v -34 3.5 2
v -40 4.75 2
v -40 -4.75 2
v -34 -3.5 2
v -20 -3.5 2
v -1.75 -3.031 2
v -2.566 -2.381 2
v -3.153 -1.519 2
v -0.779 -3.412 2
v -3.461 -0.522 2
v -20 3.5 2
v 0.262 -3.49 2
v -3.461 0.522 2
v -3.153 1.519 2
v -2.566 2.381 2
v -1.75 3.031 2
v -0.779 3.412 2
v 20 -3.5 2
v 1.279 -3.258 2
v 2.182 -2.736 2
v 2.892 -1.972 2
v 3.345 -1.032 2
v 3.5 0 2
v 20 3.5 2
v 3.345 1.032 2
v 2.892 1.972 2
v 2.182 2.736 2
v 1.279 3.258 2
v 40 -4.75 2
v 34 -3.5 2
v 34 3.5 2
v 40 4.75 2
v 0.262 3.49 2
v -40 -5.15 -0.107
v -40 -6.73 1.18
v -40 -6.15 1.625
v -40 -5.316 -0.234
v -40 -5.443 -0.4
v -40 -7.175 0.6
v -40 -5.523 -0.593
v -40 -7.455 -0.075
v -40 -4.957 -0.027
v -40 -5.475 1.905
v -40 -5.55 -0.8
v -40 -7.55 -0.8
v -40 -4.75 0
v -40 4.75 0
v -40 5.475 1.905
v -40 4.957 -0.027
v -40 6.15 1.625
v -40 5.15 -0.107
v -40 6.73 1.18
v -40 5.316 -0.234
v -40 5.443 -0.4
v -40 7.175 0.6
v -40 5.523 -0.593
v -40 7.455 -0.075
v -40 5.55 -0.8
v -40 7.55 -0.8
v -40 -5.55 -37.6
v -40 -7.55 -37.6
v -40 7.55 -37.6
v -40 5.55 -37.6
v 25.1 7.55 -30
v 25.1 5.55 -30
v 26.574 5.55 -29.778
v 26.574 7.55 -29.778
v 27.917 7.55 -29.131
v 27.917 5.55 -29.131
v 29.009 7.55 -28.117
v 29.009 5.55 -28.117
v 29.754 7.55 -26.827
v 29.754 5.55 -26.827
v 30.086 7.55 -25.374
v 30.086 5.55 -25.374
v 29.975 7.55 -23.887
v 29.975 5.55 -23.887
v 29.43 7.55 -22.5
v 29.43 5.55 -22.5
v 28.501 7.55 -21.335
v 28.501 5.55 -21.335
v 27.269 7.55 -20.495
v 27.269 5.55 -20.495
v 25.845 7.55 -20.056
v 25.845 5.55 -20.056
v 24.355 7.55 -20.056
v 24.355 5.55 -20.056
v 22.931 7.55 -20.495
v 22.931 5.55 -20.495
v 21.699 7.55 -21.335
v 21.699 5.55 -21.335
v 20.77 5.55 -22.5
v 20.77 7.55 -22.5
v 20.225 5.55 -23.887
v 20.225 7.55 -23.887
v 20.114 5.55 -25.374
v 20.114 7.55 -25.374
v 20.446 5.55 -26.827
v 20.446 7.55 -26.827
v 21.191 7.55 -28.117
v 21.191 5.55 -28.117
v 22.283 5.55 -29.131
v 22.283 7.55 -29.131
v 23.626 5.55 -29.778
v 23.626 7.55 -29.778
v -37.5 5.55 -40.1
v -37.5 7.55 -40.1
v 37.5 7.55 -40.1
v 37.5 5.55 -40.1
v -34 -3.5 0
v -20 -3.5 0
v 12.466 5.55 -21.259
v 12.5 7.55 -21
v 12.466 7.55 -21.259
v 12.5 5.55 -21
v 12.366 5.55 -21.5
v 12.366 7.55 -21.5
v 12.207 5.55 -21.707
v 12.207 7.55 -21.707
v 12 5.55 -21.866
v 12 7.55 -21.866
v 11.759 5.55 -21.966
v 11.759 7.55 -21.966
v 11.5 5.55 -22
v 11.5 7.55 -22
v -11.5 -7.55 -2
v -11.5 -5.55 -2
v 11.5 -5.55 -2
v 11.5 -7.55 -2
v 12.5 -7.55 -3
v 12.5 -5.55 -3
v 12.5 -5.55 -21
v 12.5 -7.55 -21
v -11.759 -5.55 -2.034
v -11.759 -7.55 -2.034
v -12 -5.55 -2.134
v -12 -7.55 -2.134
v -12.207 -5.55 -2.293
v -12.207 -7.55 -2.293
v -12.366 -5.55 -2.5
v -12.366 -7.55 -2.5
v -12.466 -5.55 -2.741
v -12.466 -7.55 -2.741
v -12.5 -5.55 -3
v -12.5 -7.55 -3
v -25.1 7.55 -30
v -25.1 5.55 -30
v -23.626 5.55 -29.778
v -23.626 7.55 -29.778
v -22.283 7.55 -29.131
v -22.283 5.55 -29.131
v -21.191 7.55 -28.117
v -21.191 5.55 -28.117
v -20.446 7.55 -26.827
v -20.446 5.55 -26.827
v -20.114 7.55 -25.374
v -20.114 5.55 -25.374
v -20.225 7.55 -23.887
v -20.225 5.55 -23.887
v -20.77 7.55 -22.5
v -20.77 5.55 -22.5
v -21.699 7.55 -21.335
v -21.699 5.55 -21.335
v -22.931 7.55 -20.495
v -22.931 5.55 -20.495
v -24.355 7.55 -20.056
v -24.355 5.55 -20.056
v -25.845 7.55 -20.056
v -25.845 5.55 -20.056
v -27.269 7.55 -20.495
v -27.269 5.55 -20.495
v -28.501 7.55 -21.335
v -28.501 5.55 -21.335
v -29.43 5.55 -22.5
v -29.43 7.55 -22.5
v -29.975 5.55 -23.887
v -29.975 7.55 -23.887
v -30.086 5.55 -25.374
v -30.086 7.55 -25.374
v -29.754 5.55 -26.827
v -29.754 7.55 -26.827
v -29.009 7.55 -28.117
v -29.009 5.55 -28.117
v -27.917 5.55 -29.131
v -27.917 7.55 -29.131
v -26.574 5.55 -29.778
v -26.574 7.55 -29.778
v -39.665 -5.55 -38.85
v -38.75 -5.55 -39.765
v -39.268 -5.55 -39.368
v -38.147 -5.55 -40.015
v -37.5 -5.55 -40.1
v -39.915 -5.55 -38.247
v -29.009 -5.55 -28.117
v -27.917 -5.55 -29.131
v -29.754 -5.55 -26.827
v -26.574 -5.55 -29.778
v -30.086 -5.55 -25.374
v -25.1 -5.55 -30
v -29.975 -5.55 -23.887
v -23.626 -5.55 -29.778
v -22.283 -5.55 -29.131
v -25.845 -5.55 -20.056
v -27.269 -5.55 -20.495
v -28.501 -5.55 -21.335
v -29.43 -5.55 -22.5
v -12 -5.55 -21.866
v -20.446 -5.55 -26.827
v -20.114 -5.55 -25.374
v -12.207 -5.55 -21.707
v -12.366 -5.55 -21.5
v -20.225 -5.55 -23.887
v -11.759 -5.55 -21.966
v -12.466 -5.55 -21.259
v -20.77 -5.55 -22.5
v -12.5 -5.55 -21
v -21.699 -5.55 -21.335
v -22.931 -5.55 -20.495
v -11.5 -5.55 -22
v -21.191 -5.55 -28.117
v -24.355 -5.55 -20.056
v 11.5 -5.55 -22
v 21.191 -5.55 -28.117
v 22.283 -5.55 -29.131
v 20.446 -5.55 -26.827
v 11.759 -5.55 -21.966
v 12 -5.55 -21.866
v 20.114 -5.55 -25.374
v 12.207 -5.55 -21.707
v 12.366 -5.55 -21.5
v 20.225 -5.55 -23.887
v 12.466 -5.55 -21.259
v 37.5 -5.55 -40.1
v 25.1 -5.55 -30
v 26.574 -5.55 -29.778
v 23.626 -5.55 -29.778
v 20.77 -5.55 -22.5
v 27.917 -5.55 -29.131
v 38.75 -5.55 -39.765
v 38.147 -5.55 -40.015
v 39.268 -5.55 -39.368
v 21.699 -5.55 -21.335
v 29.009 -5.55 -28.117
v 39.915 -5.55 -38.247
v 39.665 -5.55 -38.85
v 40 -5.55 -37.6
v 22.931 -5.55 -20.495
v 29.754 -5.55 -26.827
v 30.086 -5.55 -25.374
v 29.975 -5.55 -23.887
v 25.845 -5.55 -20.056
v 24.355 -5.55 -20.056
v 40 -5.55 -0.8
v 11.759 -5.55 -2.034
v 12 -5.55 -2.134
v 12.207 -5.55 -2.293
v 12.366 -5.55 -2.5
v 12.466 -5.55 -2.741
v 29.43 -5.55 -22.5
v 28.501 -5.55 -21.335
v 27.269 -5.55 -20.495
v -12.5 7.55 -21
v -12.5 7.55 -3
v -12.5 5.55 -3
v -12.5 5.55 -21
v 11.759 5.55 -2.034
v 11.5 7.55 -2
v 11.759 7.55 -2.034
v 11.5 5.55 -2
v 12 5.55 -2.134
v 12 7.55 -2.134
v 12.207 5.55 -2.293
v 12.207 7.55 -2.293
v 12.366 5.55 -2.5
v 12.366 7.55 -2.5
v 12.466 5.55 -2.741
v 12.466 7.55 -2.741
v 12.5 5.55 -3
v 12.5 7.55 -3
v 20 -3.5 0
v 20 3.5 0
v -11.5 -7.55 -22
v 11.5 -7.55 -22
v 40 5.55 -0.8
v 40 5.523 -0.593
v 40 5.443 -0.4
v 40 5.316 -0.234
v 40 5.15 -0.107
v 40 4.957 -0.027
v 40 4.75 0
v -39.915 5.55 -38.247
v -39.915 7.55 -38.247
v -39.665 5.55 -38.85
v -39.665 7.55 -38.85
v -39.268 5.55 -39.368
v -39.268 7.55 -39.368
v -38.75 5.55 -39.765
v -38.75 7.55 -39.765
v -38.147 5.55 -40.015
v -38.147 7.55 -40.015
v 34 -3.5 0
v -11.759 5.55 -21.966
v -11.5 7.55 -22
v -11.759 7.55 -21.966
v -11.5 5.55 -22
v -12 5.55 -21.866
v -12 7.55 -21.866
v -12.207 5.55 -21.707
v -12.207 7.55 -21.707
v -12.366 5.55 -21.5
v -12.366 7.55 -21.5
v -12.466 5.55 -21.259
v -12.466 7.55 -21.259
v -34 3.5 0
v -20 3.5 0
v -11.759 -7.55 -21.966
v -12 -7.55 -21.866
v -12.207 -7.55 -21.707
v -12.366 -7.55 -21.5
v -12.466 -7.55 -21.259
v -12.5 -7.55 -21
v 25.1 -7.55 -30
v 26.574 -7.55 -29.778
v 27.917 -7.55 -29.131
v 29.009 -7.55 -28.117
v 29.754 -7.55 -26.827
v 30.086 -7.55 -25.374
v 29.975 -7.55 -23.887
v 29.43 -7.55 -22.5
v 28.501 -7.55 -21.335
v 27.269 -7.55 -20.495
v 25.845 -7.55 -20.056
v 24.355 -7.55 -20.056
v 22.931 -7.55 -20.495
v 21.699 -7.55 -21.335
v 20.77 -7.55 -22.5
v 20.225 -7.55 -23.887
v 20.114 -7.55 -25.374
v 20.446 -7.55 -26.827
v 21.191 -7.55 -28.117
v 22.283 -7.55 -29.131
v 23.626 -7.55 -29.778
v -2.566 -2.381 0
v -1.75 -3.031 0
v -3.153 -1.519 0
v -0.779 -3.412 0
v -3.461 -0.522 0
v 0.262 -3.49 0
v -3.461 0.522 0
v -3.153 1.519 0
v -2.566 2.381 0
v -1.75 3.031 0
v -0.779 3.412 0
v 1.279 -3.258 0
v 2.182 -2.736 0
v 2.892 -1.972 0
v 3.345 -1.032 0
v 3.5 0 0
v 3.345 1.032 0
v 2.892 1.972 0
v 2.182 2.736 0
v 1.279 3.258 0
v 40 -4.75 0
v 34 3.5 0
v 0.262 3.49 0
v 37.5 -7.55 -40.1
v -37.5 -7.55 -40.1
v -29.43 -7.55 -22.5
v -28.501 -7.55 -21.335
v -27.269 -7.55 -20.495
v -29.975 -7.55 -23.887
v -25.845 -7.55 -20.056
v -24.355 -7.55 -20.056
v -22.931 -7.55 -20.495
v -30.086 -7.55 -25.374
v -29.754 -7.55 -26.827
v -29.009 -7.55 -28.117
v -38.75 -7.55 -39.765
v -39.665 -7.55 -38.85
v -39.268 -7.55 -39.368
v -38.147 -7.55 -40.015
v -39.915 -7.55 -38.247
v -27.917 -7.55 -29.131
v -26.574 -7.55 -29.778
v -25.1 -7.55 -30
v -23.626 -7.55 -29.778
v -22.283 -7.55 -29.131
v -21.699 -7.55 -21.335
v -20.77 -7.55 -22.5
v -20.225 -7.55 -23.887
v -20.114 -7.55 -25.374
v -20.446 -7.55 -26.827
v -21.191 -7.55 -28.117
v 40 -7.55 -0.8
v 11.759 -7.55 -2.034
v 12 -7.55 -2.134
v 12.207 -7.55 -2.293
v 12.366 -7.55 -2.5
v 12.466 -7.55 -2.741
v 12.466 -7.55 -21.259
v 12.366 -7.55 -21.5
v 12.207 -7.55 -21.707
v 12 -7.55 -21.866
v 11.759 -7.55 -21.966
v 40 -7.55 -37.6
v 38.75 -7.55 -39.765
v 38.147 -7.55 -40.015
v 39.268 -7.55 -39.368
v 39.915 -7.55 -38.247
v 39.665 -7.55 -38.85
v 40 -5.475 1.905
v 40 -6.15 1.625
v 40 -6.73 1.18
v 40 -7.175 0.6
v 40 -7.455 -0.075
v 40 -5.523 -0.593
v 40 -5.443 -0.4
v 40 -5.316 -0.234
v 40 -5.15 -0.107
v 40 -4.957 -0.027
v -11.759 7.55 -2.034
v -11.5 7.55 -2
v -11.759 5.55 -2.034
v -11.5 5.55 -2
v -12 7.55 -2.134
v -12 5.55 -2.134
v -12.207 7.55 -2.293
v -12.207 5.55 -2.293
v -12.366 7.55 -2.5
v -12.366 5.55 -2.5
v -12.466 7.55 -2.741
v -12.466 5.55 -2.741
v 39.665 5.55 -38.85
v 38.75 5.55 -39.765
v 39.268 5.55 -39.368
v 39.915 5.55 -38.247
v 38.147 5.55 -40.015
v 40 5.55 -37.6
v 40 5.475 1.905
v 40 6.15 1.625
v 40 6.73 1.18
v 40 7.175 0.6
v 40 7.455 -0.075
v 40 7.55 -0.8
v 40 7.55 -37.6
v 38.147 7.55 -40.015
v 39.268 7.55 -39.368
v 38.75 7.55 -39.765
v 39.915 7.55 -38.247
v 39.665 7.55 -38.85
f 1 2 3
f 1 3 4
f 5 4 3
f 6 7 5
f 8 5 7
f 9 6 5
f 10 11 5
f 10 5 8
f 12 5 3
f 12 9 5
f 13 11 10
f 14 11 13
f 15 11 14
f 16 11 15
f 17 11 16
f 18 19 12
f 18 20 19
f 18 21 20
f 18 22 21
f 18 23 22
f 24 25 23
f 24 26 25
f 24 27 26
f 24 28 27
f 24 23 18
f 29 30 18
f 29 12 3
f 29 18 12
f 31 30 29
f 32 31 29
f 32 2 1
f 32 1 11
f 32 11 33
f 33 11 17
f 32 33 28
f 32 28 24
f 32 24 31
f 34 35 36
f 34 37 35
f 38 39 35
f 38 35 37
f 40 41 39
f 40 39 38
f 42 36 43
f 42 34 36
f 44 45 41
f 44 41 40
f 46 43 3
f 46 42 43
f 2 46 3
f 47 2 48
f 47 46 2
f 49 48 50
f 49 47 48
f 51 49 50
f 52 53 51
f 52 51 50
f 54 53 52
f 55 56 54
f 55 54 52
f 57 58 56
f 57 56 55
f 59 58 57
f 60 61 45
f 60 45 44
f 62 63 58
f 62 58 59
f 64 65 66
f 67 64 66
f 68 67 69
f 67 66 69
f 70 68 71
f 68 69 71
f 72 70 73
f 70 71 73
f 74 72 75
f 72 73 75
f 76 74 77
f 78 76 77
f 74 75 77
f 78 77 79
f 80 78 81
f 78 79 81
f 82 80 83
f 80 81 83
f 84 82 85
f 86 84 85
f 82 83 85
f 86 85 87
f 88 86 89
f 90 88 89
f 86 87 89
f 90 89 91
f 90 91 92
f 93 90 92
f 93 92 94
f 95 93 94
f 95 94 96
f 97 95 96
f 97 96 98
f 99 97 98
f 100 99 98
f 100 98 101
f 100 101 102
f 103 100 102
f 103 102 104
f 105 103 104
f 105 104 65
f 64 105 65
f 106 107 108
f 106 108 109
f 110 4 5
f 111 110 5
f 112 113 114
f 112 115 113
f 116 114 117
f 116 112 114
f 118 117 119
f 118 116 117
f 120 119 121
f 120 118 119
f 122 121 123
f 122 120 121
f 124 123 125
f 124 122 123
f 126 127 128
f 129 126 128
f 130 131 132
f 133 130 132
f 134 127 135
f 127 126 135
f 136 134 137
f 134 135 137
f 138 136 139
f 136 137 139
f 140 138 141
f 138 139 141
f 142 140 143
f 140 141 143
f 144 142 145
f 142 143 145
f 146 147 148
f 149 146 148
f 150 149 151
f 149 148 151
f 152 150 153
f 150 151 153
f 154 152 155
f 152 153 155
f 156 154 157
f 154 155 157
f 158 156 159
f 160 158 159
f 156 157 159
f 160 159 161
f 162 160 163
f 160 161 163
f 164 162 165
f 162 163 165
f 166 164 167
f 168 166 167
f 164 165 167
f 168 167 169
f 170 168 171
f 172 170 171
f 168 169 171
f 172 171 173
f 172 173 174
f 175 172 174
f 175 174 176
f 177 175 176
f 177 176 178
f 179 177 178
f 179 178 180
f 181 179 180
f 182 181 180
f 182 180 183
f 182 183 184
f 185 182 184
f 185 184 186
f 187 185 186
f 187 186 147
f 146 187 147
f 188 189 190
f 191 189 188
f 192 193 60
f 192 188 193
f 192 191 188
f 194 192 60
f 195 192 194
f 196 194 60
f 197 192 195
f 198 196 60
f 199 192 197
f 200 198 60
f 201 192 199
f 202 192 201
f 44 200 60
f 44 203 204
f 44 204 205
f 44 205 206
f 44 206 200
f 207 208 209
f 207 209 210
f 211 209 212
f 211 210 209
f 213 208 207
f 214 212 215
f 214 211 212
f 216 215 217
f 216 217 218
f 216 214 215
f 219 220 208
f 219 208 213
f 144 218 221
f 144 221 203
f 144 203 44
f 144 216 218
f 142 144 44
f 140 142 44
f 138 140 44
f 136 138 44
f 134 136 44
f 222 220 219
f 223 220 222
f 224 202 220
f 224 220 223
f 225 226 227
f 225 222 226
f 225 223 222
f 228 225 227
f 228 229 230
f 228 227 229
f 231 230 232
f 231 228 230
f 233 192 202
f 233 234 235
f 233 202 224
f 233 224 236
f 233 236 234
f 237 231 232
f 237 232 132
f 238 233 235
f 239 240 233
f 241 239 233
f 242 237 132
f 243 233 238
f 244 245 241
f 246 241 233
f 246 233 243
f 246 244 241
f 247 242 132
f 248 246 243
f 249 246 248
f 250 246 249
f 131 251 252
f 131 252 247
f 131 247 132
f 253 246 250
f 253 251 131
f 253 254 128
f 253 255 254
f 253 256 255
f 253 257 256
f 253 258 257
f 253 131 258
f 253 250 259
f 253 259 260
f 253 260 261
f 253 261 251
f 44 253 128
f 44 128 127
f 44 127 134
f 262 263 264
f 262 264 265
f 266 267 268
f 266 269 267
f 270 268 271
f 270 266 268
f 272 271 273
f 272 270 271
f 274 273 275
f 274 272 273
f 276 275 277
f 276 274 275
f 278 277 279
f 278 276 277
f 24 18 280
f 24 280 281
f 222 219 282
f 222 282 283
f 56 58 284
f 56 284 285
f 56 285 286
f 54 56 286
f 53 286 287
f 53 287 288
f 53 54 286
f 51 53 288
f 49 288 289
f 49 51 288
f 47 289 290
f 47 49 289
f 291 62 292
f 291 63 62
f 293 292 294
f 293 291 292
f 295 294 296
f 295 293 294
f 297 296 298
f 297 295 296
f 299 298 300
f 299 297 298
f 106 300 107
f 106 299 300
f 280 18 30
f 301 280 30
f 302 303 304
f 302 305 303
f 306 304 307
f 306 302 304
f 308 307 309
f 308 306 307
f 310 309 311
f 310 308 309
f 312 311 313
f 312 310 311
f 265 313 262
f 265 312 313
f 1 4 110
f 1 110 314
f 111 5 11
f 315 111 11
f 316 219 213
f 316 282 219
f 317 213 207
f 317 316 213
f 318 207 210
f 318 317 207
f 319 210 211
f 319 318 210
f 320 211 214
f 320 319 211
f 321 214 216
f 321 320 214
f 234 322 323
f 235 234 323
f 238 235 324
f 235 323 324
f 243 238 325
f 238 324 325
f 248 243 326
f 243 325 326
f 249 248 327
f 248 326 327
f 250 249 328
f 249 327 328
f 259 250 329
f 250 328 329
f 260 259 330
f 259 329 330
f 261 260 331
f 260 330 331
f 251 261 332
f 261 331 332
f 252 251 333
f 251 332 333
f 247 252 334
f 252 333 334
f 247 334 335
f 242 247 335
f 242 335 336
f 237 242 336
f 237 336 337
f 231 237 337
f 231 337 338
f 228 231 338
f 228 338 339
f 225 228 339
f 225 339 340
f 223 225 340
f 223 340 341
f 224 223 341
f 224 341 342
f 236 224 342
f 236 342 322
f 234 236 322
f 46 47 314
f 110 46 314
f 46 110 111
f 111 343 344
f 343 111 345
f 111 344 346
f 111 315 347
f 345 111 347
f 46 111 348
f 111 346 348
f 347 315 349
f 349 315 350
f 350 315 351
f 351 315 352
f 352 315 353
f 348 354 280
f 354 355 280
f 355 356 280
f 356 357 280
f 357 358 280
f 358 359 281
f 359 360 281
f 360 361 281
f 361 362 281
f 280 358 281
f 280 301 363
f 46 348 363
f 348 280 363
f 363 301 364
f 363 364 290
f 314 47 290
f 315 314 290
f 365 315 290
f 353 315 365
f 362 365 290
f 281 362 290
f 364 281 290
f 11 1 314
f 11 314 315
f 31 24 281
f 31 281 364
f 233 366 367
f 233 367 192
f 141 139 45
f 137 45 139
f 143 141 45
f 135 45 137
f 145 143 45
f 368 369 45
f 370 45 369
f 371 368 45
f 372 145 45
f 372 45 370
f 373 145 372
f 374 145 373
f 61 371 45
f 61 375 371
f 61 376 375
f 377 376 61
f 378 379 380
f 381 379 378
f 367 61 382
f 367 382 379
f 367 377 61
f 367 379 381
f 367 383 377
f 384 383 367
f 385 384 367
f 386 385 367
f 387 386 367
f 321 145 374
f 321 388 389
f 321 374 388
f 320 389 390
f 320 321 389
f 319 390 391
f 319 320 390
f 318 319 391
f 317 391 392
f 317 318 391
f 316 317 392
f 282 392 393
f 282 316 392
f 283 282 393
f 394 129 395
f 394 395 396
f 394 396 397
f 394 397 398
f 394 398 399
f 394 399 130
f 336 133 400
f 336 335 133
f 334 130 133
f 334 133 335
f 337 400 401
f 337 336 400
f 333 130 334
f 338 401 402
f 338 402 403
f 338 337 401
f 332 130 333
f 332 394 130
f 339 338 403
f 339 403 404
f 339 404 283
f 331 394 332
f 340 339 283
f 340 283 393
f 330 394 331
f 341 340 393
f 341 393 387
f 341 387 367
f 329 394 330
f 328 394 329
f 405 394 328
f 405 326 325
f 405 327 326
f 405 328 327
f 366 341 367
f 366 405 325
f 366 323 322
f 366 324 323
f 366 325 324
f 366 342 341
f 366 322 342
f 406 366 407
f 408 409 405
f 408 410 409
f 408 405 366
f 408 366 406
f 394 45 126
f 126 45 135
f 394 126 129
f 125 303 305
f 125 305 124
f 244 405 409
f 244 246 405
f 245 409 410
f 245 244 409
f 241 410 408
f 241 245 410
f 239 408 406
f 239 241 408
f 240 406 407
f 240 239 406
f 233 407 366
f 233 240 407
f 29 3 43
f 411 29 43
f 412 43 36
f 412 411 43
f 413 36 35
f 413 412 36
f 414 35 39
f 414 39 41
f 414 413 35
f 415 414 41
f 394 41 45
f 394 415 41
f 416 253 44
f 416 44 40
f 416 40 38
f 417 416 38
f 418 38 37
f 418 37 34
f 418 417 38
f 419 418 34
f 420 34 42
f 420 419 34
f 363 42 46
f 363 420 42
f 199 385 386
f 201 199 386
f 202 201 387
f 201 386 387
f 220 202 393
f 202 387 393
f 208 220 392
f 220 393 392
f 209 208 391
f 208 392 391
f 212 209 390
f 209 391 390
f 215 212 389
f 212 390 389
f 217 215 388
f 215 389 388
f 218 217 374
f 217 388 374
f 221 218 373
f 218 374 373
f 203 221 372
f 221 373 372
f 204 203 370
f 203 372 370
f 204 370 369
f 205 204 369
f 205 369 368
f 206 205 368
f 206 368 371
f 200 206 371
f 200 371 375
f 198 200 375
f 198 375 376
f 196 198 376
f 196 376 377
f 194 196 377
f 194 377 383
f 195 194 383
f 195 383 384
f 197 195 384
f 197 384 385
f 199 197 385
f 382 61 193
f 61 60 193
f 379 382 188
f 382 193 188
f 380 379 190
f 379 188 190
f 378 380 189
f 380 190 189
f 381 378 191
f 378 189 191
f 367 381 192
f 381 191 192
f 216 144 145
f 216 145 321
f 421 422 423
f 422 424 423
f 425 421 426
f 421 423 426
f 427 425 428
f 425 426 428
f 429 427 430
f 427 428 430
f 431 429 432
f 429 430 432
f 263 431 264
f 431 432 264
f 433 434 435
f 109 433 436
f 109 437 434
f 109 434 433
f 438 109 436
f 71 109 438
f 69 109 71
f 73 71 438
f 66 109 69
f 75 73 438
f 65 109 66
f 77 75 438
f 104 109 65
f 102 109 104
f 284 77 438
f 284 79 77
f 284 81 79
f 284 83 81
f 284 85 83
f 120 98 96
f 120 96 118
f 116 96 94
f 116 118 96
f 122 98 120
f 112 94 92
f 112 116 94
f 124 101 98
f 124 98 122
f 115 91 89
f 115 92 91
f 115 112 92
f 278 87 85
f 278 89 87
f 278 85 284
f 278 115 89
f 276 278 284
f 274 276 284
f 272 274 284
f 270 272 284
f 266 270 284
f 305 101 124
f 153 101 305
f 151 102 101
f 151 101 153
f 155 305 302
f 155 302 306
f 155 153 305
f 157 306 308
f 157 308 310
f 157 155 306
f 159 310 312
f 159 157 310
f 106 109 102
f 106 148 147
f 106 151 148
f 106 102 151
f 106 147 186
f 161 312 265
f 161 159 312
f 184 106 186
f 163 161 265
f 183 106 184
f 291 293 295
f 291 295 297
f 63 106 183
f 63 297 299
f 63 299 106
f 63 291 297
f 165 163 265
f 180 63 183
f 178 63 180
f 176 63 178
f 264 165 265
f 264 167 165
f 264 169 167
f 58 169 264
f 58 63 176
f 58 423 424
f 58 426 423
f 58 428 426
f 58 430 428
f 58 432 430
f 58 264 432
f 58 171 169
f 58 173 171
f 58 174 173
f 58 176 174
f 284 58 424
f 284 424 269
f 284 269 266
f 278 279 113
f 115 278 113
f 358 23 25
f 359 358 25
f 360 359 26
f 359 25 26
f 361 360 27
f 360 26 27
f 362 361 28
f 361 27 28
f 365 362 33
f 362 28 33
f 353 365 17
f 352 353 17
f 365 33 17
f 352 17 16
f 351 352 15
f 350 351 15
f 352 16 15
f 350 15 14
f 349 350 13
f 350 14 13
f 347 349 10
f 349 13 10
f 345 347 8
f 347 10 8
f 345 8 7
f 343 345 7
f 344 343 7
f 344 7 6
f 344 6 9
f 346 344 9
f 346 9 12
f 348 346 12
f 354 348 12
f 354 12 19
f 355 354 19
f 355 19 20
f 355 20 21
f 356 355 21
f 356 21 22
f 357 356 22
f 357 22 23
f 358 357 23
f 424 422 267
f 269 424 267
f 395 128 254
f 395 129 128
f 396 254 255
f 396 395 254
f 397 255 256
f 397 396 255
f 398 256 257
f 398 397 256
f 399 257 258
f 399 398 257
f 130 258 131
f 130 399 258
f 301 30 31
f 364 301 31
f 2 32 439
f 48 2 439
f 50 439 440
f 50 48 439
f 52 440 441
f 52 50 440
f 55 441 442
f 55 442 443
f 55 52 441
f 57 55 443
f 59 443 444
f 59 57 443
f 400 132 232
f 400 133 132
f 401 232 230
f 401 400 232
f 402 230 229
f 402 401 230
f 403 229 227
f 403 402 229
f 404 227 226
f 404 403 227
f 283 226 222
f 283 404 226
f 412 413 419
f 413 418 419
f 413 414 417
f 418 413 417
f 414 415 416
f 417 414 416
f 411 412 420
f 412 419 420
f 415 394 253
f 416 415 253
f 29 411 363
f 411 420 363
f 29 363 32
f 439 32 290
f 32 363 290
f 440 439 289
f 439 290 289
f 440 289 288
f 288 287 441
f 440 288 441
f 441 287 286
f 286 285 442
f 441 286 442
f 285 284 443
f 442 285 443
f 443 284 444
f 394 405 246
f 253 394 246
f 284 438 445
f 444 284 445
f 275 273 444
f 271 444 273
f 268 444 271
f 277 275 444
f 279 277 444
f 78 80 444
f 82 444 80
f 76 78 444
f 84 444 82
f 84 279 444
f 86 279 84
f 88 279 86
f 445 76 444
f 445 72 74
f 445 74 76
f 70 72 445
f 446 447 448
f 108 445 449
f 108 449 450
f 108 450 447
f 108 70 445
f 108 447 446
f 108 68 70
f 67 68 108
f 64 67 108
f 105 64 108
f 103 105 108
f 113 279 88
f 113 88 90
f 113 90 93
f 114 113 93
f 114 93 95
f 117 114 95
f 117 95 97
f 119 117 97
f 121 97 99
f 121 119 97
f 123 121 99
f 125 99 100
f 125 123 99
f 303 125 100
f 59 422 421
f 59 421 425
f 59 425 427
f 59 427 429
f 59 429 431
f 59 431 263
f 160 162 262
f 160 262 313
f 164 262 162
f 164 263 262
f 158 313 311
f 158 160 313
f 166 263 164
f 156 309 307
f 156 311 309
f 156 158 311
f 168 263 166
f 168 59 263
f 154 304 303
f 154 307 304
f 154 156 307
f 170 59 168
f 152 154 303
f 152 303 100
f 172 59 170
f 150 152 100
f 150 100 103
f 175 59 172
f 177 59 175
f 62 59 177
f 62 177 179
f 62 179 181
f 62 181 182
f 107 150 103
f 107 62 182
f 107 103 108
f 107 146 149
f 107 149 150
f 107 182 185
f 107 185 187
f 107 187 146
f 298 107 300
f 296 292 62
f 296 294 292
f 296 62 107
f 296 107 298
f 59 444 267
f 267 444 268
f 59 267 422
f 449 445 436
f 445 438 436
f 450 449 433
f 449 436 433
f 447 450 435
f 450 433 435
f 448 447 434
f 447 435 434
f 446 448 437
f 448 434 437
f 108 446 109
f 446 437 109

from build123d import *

# Parameters (mm, degrees)
SKETCH1_W                      = 80
SKETCH1_H                      = 2
BASE_FLANGE1_DEPTH             = 5.55
EDGE_FLANGE1_STRIP_W           = 9.6
EDGE_FLANGE1_STRIP_H           = 2
EDGE_FLANGE1_STRIP_CUT_DEPTH   = 80
EDGE_FLANGE1_STRIP_2_W         = 9.6
EDGE_FLANGE1_STRIP_2_H         = 2
EDGE_FLANGE1_STRIP_CUT_2_DEPTH = 80
EDGE_FLANGE1_DEPTH             = 80
EDGE_FLANGE1_BEND_DEPTH        = 80
SKETCH12_R                     = 3.5
SKETCH12_W                     = 14
SKETCH12_H                     = 7
CUT_EXTRUDE1_DEPTH             = 59.561185951
SKETCH13_W                     = 25
SKETCH13_H                     = 20
CUT_EXTRUDE2_DEPTH             = 59.617574157
FILLET1_R                      = 1
FILLET2_R                      = 2.5
SKETCH15_R                     = 5
CUT_EXTRUDE3_DEPTH             = 59.617574157


# Sheet-metal steps are written as plain solids
with BuildPart() as part:
    # Sketch1 → Base-Flange1 (new, symmetric)
    with BuildSketch(Plane(origin=(0, 0, 0), x_dir=(1, 0, 0), z_dir=(0, 1, 0))):
        with Locations((0, -1)):
            Rectangle(SKETCH1_W, SKETCH1_H)
    extrude(amount=BASE_FLANGE1_DEPTH, both=True)

    # Edge-Flange1 strip (across the edge) → Edge-Flange1 strip cut (cut)
    with BuildSketch(Plane(origin=(40, -5.55, 0), x_dir=(0, 1, 0), z_dir=(-1, 0, 0))):
        with Locations((-4, -1)):
            Rectangle(EDGE_FLANGE1_STRIP_W, EDGE_FLANGE1_STRIP_H)
    extrude(amount=EDGE_FLANGE1_STRIP_CUT_DEPTH, mode=Mode.SUBTRACT)

    # Edge-Flange1 strip 2 (across the edge) → Edge-Flange1 strip cut 2 (cut)
    with BuildSketch(Plane(origin=(-40, 5.55, 0), x_dir=(0, -1, 0), z_dir=(1, 0, 0))):
        with Locations((-4, -1)):
            Rectangle(EDGE_FLANGE1_STRIP_2_W, EDGE_FLANGE1_STRIP_2_H)
    extrude(amount=EDGE_FLANGE1_STRIP_CUT_2_DEPTH, mode=Mode.SUBTRACT)

    # Edge-Flange1 section (across the edge) → Edge-Flange1 (add)
    with BuildSketch(Plane(origin=(40, -5.55, 0), x_dir=(0, 1, 0), z_dir=(-1, 0, 0))):
        with BuildLine():
            Line((-2, 0.8), (-2, 40.1))
            Line((-2, 40.1), (0, 40.1))
            Line((0, 40.1), (0, 0.8))
            ThreePointArc((0, 0.8), (0.234314575, 0.234314575), (0.8, 0))
            Line((0.8, 0), (0.8, -2))
            ThreePointArc((0.8, -2), (-1.179898987, -1.179898987), (-2, 0.8))
        make_face()
    extrude(amount=EDGE_FLANGE1_DEPTH)

    # Edge-Flange1 section 2 (across the edge) → Edge-Flange1 bend (add)
    with BuildSketch(Plane(origin=(-40, 5.55, 0), x_dir=(0, -1, 0), z_dir=(1, 0, 0))):
        with BuildLine():
            Line((-2, 0.8), (-2, 40.1))
            Line((-2, 40.1), (0, 40.1))
            Line((0, 40.1), (0, 0.8))
            ThreePointArc((0, 0.8), (0.234314575, 0.234314575), (0.8, 0))
            Line((0.8, 0), (0.8, -2))
            ThreePointArc((0.8, -2), (-1.179898987, -1.179898987), (-2, 0.8))
        make_face()
    extrude(amount=EDGE_FLANGE1_BEND_DEPTH)

    # Sketch12 → Cut-Extrude1 (cut, through all)
    with BuildSketch(Plane.XY.offset(2)):
        Circle(SKETCH12_R)
        with Locations((-27, 0)):
            Rectangle(SKETCH12_W, SKETCH12_H)
        with Locations((27, 0)):
            Rectangle(SKETCH12_W, SKETCH12_H)
    extrude(amount=-CUT_EXTRUDE1_DEPTH, mode=Mode.SUBTRACT)

    # Sketch13 → Cut-Extrude2 (cut, through all)
    with BuildSketch(Plane(origin=(0, 7.55, 0), x_dir=(1, 0, 0), z_dir=(0, 1, 0))):
        with Locations((0, 12)):
            Rectangle(SKETCH13_W, SKETCH13_H)
    extrude(amount=-CUT_EXTRUDE2_DEPTH, mode=Mode.SUBTRACT)

    # Fillet1
    fillet1_edges = [part.edges().sort_by_distance(p)[0] for p in [
        (-12.5, -6.55, -2),
        (-12.5, -6.55, -22),
        (12.5, -6.55, -22),
        (12.5, -6.55, -2),
        (-12.5, 6.55, -2),
        (-12.5, 6.55, -22),
        (12.5, 6.55, -22),
        (12.5, 6.55, -2),
    ]]
    fillet(fillet1_edges, radius=FILLET1_R)

    # Fillet2
    fillet2_edges = [part.edges().sort_by_distance(p)[0] for p in [
        (40, -6.55, -40.1),
        (-40, -6.55, -40.1),
        (-40, 6.55, -40.1),
        (40, 6.55, -40.1),
    ]]
    fillet(fillet2_edges, radius=FILLET2_R)

    # Sketch15 → Cut-Extrude3 (cut, through all)
    with BuildSketch(Plane.XZ.offset(7.55)):
        with Locations(Location((25.1, -25, 0), (0, 0, 270))):
            Circle(SKETCH15_R)
        with Locations(Location((-25.1, -25, 0), (0, 0, 270))):
            Circle(SKETCH15_R)
    extrude(amount=-CUT_EXTRUDE3_DEPTH, mode=Mode.SUBTRACT)


solid = part.part
